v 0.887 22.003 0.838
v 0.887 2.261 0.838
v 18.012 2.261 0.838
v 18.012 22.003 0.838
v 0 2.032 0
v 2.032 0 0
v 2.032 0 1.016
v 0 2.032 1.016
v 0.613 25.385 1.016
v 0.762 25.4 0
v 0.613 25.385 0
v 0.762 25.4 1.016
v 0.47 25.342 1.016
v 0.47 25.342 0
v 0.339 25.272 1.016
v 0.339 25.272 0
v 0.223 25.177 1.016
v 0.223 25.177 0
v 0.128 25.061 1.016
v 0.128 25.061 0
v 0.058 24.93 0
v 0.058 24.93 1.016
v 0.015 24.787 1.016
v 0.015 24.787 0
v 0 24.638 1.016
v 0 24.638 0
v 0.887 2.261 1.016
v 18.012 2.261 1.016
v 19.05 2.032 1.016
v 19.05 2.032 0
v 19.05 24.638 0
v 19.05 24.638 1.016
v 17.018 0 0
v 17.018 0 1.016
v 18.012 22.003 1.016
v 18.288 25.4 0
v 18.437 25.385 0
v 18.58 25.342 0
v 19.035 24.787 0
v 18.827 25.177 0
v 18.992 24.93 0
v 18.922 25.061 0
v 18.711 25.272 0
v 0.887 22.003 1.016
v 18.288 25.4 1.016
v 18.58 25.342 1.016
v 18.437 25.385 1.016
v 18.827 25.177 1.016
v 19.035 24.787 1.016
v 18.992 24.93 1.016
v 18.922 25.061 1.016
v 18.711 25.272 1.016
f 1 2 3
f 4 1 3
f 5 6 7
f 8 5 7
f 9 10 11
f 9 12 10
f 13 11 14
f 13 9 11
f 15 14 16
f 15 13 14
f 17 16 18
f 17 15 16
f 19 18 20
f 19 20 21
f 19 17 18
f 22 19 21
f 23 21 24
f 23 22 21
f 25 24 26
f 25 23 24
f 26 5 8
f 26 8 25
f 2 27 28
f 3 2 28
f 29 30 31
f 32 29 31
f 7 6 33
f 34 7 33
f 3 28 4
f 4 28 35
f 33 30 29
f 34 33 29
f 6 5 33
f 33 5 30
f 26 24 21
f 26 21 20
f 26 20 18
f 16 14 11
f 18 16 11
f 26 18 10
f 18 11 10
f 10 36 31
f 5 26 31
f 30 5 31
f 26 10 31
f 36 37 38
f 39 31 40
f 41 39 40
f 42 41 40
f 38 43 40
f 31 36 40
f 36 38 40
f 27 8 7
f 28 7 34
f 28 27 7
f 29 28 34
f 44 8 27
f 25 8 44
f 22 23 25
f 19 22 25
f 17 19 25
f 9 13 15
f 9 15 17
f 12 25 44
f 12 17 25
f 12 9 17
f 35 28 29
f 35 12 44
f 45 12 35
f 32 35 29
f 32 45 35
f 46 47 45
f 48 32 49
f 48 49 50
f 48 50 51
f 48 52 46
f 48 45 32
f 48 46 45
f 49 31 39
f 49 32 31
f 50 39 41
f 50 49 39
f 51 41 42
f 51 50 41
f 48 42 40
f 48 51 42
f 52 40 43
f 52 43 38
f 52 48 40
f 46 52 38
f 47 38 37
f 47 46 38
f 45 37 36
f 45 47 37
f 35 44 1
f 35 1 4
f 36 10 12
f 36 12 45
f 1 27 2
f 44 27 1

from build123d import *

# Parameters (mm, degrees)
F0_W     = 19.05
F0_H     = 25.4
F1_DEPTH = 1.016
F2_SIZE  = 2.032
F3_SIZE  = 2.032
F4_R     = 0.762
F5_R     = 0.762
F6_W     = 17.124948
F6_H     = 19.74232
F7_DEPTH = 0.1778


with BuildPart() as f1:
    # F0 (on Top) → F1 (new body)
    with BuildSketch(Plane.XY):
        with Locations((9.525, 12.7)):
            Rectangle(F0_W, F0_H)
    extrude(amount=F1_DEPTH)

    # F2
    f2_edges = [f1.edges().sort_by_distance(p)[0] for p in [
        (0, 0, 0.508),
    ]]
    chamfer(f2_edges, length=F2_SIZE)

    # F3
    f3_edges = [f1.edges().sort_by_distance(p)[0] for p in [
        (19.05, 0, 0.508),
    ]]
    chamfer(f3_edges, length=F3_SIZE)

    # F4
    f4_edges = [f1.edges().sort_by_distance(p)[0] for p in [
        (19.05, 25.4, 0.508),
    ]]
    fillet(f4_edges, radius=F4_R)

    # F5
    f5_edges = [f1.edges().sort_by_distance(p)[0] for p in [
        (0, 25.4, 0.508),
    ]]
    fillet(f5_edges, radius=F5_R)

    # F6 (on face) → F7 (cut)
    with BuildSketch(Plane.XY.offset(1.016)):
        with Locations((9.449543, 12.13214)):
            Rectangle(F6_W, F6_H)
    extrude(amount=-F7_DEPTH, mode=Mode.SUBTRACT)


solid = f1.part
